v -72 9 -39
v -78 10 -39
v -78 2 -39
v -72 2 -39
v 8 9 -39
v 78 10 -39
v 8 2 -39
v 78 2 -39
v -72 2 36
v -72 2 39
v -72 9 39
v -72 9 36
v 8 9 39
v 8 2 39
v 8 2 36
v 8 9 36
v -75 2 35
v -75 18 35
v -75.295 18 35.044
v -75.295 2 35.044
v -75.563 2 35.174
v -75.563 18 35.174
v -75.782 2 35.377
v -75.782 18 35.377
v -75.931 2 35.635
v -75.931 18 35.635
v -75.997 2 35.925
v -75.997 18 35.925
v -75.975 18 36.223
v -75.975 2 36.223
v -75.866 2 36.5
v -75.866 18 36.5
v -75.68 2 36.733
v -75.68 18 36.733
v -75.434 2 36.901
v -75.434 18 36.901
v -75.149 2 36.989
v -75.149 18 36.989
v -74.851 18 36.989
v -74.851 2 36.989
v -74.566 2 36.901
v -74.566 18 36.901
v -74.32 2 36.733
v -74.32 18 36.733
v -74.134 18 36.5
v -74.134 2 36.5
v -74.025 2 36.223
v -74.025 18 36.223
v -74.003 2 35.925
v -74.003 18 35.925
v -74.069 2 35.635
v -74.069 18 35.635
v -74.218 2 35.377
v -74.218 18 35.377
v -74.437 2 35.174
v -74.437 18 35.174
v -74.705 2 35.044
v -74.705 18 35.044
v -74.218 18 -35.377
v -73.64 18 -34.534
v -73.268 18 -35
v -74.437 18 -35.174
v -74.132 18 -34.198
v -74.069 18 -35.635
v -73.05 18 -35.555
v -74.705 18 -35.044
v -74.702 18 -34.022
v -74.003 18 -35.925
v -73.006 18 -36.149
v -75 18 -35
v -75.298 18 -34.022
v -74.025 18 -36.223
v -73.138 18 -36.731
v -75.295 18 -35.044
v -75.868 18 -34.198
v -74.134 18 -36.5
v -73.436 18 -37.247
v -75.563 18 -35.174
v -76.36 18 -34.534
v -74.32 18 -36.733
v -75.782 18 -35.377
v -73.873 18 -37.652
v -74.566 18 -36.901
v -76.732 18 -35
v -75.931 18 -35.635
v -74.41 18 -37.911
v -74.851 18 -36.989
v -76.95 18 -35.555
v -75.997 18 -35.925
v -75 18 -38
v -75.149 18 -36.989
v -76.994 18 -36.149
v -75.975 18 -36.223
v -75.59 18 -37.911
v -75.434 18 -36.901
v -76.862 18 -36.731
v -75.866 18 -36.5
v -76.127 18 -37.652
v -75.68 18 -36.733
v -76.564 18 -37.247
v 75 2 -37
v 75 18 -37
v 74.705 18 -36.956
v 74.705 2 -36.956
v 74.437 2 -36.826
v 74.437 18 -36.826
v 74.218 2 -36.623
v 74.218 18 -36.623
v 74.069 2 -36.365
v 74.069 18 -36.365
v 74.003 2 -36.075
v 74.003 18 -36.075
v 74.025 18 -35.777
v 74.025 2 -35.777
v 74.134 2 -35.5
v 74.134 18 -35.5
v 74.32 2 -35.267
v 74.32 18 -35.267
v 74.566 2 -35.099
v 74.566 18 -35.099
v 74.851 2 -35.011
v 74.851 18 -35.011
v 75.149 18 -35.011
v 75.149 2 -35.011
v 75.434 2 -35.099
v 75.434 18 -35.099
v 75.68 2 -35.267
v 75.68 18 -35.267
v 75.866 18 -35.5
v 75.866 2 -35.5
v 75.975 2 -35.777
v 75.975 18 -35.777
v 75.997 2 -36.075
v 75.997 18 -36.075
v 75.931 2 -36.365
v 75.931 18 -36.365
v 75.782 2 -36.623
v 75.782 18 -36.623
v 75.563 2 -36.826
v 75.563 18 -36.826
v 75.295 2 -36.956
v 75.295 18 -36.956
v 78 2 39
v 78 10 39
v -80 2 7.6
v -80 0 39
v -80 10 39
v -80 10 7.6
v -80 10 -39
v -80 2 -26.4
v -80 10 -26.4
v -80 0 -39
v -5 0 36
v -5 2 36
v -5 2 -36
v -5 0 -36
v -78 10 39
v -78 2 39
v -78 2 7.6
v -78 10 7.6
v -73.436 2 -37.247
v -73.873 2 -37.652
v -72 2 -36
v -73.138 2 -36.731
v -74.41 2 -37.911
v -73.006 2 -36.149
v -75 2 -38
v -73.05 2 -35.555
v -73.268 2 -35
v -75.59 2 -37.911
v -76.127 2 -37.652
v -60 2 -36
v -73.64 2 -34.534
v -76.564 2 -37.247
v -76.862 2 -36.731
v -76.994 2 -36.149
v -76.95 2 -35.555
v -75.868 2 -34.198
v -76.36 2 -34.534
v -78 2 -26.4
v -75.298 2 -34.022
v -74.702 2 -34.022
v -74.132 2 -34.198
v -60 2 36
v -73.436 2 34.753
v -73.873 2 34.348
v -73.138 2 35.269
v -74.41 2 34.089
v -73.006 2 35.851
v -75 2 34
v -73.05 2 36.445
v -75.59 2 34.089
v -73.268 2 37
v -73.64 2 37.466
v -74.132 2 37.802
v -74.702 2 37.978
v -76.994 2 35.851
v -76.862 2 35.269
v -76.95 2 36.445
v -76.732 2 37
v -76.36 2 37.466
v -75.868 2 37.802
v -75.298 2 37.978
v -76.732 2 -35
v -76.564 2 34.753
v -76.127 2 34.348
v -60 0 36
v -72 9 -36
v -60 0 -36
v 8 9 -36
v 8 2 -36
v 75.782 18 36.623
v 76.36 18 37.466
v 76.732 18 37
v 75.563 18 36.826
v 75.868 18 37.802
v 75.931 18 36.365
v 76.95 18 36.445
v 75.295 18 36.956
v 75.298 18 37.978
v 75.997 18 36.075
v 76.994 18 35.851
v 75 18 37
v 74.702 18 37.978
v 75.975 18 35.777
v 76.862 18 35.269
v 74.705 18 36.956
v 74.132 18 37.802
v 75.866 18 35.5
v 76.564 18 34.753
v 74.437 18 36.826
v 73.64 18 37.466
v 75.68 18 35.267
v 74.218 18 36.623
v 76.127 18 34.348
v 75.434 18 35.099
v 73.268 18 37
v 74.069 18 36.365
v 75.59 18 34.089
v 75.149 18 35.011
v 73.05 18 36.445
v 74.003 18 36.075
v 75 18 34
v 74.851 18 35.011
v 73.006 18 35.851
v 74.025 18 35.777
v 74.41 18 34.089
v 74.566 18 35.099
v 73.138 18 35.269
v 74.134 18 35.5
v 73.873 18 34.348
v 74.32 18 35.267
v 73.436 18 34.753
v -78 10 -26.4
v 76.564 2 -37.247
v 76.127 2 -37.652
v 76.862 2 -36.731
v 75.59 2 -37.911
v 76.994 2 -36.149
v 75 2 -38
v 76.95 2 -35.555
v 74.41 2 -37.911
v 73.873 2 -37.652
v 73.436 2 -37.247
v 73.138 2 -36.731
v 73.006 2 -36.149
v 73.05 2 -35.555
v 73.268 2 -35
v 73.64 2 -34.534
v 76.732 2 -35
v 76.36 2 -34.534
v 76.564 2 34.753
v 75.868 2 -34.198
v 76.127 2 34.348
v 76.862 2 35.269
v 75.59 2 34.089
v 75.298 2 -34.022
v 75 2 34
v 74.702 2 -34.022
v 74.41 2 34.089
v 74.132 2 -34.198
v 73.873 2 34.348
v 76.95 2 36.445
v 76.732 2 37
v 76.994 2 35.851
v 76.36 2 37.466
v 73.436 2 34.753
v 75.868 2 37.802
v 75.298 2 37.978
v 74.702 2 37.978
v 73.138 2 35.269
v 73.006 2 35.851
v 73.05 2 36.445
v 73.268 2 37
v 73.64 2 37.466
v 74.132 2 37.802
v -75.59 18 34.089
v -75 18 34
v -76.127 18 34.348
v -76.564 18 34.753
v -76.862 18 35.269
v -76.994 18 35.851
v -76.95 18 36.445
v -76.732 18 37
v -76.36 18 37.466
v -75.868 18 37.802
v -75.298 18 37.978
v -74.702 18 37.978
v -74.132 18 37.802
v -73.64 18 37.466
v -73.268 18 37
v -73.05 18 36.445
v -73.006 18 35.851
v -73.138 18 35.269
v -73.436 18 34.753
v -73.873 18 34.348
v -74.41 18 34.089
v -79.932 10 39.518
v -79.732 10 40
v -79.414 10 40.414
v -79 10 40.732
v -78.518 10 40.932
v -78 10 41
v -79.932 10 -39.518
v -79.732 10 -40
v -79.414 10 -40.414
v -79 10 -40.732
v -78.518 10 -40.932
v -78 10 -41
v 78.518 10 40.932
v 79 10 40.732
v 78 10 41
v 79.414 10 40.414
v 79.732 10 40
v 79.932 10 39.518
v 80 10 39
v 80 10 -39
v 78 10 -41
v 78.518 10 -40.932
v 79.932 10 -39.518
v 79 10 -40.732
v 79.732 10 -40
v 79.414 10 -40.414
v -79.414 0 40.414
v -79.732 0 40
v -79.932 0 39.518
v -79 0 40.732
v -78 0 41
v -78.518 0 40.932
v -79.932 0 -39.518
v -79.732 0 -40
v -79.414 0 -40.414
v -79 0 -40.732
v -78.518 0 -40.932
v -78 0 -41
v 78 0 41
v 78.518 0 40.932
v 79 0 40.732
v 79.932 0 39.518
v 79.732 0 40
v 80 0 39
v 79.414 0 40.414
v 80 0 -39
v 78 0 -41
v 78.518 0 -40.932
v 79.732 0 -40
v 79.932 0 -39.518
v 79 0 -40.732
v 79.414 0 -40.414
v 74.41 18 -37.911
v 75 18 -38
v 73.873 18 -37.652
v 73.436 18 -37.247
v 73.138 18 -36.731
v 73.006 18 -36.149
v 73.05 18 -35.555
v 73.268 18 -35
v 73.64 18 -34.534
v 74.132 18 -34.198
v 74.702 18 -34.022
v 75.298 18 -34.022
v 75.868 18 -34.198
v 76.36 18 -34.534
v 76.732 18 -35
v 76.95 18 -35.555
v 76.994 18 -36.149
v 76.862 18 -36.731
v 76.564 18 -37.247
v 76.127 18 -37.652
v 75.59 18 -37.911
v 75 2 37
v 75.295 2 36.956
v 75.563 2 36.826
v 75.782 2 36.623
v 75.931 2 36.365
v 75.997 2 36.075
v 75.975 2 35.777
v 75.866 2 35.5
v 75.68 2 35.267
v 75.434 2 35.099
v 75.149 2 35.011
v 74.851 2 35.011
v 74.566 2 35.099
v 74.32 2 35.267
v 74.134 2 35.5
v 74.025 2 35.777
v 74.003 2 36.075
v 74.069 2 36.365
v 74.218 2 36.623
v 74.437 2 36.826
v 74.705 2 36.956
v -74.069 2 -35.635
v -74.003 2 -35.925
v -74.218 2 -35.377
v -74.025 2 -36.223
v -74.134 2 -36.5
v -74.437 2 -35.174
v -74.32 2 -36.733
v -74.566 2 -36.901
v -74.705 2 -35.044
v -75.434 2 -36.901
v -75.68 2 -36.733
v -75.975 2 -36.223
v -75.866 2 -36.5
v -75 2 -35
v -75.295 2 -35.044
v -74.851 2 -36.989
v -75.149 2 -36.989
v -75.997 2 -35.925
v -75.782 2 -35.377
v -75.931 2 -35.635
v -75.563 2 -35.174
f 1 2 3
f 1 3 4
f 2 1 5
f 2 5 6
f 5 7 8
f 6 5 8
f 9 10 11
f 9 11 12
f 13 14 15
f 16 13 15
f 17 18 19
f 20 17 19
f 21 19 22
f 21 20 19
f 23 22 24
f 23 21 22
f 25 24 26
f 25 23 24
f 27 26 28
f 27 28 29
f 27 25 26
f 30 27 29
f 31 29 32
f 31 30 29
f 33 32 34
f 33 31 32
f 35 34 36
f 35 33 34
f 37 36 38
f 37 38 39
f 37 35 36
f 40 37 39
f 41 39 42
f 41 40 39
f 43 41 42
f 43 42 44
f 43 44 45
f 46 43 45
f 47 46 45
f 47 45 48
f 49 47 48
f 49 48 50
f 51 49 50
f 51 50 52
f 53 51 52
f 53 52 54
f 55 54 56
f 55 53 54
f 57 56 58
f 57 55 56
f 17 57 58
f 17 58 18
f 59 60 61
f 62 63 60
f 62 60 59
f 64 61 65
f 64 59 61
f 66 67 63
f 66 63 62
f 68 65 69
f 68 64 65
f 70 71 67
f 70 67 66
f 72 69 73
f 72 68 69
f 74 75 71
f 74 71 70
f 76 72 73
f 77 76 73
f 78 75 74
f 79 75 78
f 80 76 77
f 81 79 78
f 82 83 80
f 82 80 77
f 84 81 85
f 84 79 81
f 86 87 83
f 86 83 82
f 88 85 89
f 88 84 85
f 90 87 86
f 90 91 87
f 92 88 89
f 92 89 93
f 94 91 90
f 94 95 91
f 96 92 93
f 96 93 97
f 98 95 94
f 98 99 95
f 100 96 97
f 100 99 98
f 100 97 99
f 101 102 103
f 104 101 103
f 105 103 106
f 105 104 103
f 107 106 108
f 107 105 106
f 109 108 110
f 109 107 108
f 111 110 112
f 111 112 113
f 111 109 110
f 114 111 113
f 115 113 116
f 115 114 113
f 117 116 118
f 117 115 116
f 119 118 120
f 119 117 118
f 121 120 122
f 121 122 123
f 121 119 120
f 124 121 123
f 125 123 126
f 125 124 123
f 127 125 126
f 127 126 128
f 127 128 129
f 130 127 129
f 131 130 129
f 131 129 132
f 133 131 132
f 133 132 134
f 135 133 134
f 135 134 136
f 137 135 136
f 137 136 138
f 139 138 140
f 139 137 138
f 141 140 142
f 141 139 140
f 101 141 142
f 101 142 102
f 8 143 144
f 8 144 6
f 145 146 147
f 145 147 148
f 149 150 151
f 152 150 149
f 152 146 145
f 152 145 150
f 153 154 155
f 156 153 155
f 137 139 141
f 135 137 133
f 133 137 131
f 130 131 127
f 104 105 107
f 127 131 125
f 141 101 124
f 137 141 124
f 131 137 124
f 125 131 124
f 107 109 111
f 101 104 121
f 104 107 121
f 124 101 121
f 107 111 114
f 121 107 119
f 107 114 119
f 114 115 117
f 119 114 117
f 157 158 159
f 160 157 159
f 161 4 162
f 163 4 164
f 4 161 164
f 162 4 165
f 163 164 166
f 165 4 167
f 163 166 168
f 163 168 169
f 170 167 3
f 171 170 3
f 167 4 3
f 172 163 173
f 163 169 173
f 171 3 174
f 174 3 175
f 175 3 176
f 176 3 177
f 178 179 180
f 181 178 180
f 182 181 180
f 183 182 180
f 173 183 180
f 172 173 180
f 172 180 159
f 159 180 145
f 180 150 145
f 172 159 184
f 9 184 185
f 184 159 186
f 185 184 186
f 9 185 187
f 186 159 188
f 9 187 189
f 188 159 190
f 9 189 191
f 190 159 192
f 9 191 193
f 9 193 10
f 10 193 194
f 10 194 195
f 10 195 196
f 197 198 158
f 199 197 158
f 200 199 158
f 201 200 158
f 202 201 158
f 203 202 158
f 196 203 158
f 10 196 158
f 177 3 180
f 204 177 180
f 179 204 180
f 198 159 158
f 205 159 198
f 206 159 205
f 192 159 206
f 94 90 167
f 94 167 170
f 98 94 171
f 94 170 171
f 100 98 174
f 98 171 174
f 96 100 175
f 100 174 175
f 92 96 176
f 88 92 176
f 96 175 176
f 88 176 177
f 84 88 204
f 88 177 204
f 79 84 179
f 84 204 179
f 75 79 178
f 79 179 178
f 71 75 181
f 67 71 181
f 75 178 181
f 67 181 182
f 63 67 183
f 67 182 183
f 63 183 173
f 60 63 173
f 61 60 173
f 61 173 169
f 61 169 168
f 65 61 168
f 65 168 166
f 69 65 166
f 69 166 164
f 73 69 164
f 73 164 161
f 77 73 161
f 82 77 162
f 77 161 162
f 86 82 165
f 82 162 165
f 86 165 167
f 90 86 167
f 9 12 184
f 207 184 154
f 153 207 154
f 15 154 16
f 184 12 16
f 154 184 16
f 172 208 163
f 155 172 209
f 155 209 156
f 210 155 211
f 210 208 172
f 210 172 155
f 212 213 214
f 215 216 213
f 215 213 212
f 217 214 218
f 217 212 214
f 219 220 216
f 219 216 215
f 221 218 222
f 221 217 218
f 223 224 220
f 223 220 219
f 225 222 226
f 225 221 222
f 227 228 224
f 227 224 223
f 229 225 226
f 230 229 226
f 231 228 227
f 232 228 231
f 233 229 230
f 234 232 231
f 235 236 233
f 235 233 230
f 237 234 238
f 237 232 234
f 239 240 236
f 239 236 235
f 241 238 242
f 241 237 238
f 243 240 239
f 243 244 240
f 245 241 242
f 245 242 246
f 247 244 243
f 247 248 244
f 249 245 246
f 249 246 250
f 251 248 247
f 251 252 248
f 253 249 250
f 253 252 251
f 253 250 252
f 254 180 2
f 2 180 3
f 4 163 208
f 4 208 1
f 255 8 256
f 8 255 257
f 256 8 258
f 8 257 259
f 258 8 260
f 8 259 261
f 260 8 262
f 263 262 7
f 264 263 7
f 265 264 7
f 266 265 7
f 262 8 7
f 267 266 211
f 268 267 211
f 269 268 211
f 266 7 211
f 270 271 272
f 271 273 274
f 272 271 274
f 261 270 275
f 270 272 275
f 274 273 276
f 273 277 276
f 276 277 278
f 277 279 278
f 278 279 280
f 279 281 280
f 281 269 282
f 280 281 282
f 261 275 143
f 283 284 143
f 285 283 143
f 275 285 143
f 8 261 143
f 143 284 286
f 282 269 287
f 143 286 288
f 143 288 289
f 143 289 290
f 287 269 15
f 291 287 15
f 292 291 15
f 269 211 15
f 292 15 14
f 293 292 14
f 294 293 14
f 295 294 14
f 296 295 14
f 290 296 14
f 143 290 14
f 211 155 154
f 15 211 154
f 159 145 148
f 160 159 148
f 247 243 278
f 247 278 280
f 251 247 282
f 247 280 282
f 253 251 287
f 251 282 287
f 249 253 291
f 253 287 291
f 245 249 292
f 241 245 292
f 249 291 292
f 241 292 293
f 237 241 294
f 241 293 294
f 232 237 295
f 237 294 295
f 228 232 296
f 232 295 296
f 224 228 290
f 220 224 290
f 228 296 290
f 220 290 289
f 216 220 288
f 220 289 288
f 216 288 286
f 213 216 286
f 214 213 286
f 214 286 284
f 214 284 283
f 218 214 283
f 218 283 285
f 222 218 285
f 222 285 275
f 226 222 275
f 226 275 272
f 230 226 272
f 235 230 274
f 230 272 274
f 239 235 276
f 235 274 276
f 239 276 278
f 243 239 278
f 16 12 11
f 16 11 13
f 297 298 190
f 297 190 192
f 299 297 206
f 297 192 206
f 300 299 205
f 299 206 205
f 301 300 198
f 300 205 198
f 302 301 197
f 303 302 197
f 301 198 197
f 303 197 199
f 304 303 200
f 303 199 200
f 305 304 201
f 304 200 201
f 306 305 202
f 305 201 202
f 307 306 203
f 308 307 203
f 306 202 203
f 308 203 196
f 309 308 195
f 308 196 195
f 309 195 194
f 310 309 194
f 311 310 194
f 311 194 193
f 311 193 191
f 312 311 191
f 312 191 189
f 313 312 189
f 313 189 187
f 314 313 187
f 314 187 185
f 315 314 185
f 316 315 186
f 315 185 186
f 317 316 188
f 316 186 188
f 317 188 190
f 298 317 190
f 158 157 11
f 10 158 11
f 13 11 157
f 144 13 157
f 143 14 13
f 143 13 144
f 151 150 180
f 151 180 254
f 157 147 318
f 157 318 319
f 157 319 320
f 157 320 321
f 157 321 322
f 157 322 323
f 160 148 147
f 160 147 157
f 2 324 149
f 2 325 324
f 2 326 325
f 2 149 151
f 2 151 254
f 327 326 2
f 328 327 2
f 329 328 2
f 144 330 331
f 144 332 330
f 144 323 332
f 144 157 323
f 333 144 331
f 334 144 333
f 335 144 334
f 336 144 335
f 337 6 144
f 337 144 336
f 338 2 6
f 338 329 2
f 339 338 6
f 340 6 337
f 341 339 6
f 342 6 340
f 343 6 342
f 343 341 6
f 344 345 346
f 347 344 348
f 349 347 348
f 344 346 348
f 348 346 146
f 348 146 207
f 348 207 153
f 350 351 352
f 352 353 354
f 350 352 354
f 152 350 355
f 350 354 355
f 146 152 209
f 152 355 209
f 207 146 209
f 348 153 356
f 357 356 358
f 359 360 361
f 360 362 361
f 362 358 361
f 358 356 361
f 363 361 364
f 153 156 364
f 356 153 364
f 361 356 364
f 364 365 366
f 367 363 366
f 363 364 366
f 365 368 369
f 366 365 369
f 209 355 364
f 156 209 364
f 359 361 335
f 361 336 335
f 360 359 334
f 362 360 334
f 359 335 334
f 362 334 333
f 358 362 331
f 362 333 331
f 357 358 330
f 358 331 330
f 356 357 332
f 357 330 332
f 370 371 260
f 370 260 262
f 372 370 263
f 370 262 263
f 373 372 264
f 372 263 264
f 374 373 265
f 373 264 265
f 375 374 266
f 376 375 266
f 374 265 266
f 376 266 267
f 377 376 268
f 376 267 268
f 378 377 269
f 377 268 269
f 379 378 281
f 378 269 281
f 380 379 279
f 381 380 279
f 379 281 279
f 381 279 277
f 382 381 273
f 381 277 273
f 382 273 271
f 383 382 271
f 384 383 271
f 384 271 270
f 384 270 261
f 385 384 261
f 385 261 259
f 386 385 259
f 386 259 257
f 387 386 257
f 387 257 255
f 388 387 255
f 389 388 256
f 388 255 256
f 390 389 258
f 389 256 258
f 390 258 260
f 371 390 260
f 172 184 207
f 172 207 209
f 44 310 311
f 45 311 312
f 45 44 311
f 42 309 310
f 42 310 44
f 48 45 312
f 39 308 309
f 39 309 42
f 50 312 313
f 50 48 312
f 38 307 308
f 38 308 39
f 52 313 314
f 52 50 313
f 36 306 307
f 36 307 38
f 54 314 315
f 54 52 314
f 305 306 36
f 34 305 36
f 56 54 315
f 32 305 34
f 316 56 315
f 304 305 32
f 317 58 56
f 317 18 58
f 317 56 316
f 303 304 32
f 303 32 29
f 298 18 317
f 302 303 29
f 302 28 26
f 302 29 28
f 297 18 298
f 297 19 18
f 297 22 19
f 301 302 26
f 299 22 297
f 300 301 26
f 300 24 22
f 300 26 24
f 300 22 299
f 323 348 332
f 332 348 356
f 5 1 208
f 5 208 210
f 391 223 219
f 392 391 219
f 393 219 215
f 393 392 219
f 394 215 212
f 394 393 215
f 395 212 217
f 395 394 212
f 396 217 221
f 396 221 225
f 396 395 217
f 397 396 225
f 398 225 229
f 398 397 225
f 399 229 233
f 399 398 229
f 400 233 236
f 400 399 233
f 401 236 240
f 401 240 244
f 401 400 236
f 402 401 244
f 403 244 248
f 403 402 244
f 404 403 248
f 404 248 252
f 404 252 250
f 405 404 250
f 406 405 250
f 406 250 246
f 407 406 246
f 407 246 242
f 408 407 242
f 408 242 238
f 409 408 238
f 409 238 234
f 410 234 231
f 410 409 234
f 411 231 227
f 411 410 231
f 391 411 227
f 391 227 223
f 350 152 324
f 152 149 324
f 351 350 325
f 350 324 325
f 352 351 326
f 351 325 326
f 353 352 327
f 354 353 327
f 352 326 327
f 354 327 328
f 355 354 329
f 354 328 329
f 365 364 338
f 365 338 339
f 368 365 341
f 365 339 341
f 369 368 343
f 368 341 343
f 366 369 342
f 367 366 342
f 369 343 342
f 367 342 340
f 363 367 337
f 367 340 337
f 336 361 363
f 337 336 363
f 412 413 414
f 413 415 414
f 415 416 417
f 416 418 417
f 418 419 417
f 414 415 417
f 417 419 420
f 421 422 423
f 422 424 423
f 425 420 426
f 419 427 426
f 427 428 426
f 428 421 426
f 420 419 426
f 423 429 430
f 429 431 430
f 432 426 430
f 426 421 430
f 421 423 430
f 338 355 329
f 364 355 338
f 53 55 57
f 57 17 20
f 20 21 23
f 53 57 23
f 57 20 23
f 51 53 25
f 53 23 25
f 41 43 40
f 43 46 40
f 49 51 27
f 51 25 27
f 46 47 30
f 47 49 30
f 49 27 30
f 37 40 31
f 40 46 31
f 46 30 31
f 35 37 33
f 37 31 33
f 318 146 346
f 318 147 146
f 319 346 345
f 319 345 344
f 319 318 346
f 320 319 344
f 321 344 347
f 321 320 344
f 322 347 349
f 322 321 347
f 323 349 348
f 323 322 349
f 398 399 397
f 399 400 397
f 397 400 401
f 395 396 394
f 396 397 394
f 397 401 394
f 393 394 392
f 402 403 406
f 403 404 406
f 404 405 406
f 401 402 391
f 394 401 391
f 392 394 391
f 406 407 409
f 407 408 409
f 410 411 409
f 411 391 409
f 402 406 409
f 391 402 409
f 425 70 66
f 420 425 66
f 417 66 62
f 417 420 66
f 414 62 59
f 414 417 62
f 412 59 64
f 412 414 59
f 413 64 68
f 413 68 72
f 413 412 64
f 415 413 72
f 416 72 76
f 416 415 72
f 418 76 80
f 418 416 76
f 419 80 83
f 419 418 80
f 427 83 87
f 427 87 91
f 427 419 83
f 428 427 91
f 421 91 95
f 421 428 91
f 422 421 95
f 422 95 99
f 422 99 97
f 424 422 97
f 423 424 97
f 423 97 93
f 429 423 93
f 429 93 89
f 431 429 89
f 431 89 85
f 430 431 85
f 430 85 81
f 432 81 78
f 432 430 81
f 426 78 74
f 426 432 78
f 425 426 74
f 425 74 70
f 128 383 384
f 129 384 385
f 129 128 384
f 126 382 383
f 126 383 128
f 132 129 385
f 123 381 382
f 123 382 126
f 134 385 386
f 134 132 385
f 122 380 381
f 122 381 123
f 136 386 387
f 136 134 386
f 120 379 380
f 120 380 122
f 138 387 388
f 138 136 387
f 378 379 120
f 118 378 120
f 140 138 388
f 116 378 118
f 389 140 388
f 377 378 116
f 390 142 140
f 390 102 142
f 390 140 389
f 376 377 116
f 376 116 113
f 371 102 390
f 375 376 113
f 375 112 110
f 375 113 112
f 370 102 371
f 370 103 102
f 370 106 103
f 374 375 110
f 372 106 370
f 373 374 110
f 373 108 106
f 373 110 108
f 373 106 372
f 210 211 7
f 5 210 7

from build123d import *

# Parameters (mm, degrees)
SKETCH1_W           = 160
SKETCH1_H           = 82
BOSS_EXTRUDE1_DEPTH = 10
SHELL1_T            = -2
FILLET1_R           = 2
FILLET2_R           = 2
FILLET3_R           = 2
FILLET4_R           = 2
SKETCH10_W          = 34
SKETCH10_H          = 8.029729716
CUT_EXTRUDE1_DEPTH  = 6
SKETCH2_R           = 2
SKETCH2_R_2         = 1
BOSS_EXTRUDE7_DEPTH = 16
SKETCH12_W          = 80
SKETCH12_H          = 3
BOSS_EXTRUDE8_DEPTH = 7
SKETCH13_W          = 55
SKETCH13_H          = 72
CUT_EXTRUDE3_DEPTH  = 200


with BuildPart() as part:
    # Sketch1 → Boss-Extrude1 (new body)
    with BuildSketch(Plane(origin=(0, 0, 0), x_dir=(1, 0, 0), z_dir=(0, 1, 0))):
        Rectangle(SKETCH1_W, SKETCH1_H)
    extrude(amount=BOSS_EXTRUDE1_DEPTH)

    # Shell1
    shell1_openings = [part.faces().sort_by_distance(p)[0] for p in [
        (0, 10, 0),
    ]]
    offset(amount=SHELL1_T, openings=shell1_openings, kind=Kind.INTERSECTION)

    # Fillet1
    fillet1_edges = [part.edges().sort_by_distance(p)[0] for p in [
        (-80, 5, 41),
    ]]
    fillet(fillet1_edges, radius=FILLET1_R)

    # Fillet2
    fillet2_edges = [part.edges().sort_by_distance(p)[0] for p in [
        (-80, 5, -41),
    ]]
    fillet(fillet2_edges, radius=FILLET2_R)

    # Fillet3
    fillet3_edges = [part.edges().sort_by_distance(p)[0] for p in [
        (80, 5, -41),
    ]]
    fillet(fillet3_edges, radius=FILLET3_R)

    # Fillet4
    fillet4_edges = [part.edges().sort_by_distance(p)[0] for p in [
        (80, 5, 41),
    ]]
    fillet(fillet4_edges, radius=FILLET4_R)

    # Sketch10 → Cut-Extrude1 (cut)
    with BuildSketch(Plane.ZY.offset(80)):
        with Locations((-9.4, 6.014864858)):
            Rectangle(SKETCH10_W, SKETCH10_H)
    extrude(amount=-CUT_EXTRUDE1_DEPTH, mode=Mode.SUBTRACT)

    # Sketch2 → Boss-Extrude7 (add)
    # profile 1 of 4: a face of its own
    with BuildSketch(Plane(origin=(0, 2, 0), x_dir=(1, 0, 0), z_dir=(0, 1, 0))):
        with Locations(Location((-75, 36, 0), (0, 0, 90))):
            Circle(SKETCH2_R)
        with Locations(Location((-75, 36, 0), (0, 0, 270))):
            Circle(SKETCH2_R_2, mode=Mode.SUBTRACT)
    # profile 2 of 4: a face of its own
    with BuildSketch(Plane(origin=(0, 2, 0), x_dir=(1, 0, 0), z_dir=(0, 1, 0))):
        with Locations(Location((75, 36, 0), (0, 0, 90))):
            Circle(SKETCH2_R)
        with Locations(Location((75, 36, 0), (0, 0, 90))):
            Circle(SKETCH2_R_2, mode=Mode.SUBTRACT)
    # profile 3 of 4: a face of its own
    with BuildSketch(Plane(origin=(0, 2, 0), x_dir=(1, 0, 0), z_dir=(0, 1, 0))):
        with Locations(Location((-75, -36, 0), (0, 0, 90))):
            Circle(SKETCH2_R)
        with Locations(Location((-75, -36, 0), (0, 0, 90))):
            Circle(SKETCH2_R_2, mode=Mode.SUBTRACT)
    # profile 4 of 4: a face of its own
    with BuildSketch(Plane(origin=(0, 2, 0), x_dir=(1, 0, 0), z_dir=(0, 1, 0))):
        with Locations(Location((75, -36, 0), (0, 0, 90))):
            Circle(SKETCH2_R)
        with Locations(Location((75, -36, 0), (0, 0, 270))):
            Circle(SKETCH2_R_2, mode=Mode.SUBTRACT)
    extrude(amount=BOSS_EXTRUDE7_DEPTH)

    # Sketch12 → Boss-Extrude8 (add)
    with BuildSketch(Plane(origin=(0, 2, 0), x_dir=(1, 0, 0), z_dir=(0, 1, 0))):
        with Locations((-32, 37.5)):
            Rectangle(SKETCH12_W, SKETCH12_H)
        with Locations((-32, -37.5)):
            Rectangle(SKETCH12_W, SKETCH12_H)
    extrude(amount=BOSS_EXTRUDE8_DEPTH)

    # Sketch13 → Cut-Extrude3 (cut)
    with BuildSketch(Plane(origin=(0, 2, 0), x_dir=(1, 0, 0), z_dir=(0, 1, 0))):
        with Locations((-32.5, 0)):
            Rectangle(SKETCH13_W, SKETCH13_H)
    extrude(amount=-CUT_EXTRUDE3_DEPTH, mode=Mode.SUBTRACT)


solid = part.part
